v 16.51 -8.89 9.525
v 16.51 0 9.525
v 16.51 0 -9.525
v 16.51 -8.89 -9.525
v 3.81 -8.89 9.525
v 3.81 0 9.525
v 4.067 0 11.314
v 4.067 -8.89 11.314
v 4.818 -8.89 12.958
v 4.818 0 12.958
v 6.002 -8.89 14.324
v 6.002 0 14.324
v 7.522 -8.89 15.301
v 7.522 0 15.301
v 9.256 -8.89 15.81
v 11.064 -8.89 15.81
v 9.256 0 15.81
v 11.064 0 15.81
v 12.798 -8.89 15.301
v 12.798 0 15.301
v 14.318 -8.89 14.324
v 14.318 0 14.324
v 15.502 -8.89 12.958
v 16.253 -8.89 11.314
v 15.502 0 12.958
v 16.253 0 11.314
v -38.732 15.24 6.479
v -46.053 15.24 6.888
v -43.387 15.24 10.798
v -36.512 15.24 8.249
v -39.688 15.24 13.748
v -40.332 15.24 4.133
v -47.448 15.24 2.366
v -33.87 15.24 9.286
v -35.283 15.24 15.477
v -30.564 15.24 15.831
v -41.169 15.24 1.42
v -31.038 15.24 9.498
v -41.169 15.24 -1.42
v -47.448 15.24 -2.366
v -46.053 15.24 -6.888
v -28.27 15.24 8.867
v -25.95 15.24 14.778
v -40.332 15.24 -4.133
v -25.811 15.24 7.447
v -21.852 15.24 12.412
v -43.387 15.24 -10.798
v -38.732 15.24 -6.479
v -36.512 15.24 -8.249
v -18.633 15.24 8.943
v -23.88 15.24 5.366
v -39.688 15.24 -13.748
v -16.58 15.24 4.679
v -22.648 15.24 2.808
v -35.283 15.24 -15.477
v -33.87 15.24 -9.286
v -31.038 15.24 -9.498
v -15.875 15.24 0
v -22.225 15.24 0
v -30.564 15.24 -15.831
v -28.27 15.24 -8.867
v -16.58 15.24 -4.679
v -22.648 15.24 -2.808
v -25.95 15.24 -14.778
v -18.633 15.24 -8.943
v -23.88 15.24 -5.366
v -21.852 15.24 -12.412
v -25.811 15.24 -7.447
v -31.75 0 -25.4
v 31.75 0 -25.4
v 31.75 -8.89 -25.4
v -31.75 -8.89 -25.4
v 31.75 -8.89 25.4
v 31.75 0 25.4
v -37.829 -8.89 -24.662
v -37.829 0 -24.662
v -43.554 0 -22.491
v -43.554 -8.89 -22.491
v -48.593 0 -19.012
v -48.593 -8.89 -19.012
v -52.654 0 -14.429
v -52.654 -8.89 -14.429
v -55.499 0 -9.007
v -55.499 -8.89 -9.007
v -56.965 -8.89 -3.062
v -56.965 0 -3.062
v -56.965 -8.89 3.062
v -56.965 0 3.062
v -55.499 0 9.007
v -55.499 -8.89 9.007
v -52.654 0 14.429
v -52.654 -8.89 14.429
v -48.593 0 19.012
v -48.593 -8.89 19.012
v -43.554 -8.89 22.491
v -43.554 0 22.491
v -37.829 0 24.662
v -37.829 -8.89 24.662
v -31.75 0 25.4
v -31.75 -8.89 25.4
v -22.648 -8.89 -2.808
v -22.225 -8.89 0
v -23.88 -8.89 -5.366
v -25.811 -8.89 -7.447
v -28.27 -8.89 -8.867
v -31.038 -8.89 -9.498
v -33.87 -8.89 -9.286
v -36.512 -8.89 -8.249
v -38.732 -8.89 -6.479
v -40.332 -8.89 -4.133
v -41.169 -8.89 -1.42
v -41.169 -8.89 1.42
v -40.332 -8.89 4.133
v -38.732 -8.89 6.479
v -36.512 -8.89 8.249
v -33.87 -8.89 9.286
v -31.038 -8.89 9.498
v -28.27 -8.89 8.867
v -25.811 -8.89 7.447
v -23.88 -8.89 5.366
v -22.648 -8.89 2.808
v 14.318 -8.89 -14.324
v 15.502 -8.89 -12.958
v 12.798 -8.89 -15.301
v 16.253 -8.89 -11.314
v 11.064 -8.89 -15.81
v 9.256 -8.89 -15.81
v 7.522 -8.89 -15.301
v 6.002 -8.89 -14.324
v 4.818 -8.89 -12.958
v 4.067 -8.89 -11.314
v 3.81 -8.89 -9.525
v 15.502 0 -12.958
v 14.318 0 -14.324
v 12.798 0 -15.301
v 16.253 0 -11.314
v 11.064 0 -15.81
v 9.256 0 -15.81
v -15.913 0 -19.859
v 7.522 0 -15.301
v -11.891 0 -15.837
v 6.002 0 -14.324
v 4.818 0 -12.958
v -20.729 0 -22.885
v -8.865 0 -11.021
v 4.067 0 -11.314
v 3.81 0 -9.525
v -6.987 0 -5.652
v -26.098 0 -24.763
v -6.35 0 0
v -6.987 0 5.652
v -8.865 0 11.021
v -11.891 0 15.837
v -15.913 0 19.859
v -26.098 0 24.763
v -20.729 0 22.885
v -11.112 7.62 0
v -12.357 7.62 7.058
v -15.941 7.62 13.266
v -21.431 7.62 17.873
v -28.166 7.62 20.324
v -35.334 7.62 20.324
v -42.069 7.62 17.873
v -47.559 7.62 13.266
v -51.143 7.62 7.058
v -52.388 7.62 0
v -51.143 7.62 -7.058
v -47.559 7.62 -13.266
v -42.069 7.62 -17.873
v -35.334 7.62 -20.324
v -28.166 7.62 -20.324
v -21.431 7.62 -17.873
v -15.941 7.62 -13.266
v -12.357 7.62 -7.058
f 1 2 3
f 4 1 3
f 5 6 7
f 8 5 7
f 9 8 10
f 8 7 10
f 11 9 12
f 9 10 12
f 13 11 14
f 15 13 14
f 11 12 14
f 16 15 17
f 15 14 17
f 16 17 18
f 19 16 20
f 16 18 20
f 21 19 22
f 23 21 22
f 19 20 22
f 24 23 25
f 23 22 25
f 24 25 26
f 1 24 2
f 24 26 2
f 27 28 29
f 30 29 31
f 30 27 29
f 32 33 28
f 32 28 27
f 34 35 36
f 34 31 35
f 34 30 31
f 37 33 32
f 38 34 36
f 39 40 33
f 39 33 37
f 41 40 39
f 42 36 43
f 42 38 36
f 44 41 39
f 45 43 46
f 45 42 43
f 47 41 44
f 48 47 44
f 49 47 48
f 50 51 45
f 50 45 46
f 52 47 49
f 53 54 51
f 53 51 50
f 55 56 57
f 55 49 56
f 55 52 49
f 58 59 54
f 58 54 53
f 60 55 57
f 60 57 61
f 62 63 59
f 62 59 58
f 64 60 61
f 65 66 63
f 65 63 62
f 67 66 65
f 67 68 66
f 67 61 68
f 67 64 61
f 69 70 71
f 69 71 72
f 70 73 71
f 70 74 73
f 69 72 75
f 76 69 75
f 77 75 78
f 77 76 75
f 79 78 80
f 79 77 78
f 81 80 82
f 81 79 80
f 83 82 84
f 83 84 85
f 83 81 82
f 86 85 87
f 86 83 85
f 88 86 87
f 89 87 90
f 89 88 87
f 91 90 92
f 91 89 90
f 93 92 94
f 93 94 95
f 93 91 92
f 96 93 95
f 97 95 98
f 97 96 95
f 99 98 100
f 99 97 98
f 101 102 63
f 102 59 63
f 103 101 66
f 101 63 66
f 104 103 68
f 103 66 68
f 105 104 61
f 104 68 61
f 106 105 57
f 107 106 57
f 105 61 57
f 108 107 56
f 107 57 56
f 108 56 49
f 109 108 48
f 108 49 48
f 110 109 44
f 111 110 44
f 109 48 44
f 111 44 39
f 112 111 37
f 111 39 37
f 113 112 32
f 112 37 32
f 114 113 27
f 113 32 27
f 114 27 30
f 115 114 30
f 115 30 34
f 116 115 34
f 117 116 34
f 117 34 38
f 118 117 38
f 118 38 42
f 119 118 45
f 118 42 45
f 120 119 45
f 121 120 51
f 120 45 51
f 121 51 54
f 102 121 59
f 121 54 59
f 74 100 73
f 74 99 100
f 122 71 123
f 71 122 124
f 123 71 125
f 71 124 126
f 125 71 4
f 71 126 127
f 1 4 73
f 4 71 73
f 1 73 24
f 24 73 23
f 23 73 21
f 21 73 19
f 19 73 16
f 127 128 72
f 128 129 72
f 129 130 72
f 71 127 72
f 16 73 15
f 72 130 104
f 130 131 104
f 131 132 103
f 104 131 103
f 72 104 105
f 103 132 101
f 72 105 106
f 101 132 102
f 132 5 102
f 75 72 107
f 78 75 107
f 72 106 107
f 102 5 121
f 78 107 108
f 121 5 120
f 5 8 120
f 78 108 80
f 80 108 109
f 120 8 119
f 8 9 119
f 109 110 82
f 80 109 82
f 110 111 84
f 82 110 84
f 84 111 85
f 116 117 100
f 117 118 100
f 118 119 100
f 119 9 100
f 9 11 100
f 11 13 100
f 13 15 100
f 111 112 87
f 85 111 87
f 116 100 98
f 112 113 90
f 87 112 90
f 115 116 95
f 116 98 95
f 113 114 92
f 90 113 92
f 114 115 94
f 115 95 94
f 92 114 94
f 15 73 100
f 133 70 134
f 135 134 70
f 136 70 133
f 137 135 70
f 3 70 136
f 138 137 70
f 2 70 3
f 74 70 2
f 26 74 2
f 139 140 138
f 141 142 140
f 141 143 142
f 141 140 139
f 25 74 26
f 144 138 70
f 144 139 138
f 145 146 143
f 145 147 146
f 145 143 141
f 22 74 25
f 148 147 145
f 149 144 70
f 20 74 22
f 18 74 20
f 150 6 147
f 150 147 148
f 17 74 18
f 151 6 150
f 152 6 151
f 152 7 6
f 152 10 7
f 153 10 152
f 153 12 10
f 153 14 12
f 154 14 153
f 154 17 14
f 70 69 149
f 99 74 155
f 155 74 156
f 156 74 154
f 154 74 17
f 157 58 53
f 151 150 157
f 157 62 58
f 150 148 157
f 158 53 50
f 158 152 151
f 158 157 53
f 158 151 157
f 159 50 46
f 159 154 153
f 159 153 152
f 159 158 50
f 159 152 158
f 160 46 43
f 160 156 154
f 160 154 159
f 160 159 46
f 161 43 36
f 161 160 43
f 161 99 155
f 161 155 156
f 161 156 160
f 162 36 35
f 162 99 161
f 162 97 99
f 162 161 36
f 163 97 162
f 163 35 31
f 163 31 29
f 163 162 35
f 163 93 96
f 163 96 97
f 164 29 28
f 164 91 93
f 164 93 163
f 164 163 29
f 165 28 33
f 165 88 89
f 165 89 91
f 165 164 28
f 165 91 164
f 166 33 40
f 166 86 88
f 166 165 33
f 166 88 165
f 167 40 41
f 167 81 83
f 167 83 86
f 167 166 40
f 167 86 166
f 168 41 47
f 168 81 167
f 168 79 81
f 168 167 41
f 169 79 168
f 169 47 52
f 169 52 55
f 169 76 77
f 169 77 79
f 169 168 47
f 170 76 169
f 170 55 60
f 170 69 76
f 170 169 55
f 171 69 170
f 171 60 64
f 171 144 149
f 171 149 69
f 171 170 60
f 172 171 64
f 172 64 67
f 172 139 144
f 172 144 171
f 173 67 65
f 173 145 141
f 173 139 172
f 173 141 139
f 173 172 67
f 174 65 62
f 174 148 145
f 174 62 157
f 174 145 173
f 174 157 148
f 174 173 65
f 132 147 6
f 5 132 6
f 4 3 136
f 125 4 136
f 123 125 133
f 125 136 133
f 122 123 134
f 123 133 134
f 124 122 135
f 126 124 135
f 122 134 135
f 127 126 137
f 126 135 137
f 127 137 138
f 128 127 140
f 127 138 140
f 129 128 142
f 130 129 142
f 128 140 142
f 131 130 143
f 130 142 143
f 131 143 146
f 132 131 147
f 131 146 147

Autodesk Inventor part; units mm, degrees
ref_plane "YZ Plane" through (0, 0, 0) normal (1, 0, 0) x (0, 1, 0)
ref_plane "XZ Plane" through (0, 0, 0) normal (0, 1, 0) x (-1, 0, 0)
sketch "Sketch1" plane through (0, 0, 0) normal (0, 1, 0) x (-1, 0, 0)
  line L0 (31.75, 25.4) -> (-31.75, 25.4)
  line L1 (-31.75, 25.4) -> (-31.75, -25.4)
  line L2 (-31.75, -25.4) -> (31.75, -25.4)
  line L3 (31.75, -25.4) -> (31.75, 25.4)
  line L4 (31.75, 25.4) -> (-31.75, -25.4) construction
  line L5 (-31.75, 25.4) -> (31.75, -25.4) construction
  arc A0 (31.75, -25.4) -> (31.75, 25.4) centre (31.75, 0) ccw
  point P0 (0, 0)
  dimension "d5" = 63.5
  dimension "d6" = 50.8
extrude "Extrusion1" add sketch "Sketch1" against normal blind 8.89
sketch "Sketch2" plane through (0, 0, 0) normal (0, 1, 0) x (1, 0, 0)
  line L0 (31.75, -25.4) -> (31.75, 25.4) projected
  line L1 (-31.75, -25.4) -> (31.75, -25.4) projected
  line L2 (31.75, 25.4) -> (-31.75, 25.4) projected
  arc A0 (-31.75, 25.4) -> (-31.75, -25.4) centre (-31.75, 0) ccw projected
  line L3 (31.75, 0) -> (16.51, 0)
  line L4 (3.81, -9.525) -> (16.51, -9.525)
  line L5 (16.51, -9.525) -> (16.51, 9.525)
  line L6 (16.51, 9.525) -> (3.81, 9.525)
  line L7 (3.81, 9.525) -> (3.81, -9.525)
  line L8 (3.81, -9.525) -> (16.51, 9.525) construction
  line L9 (16.51, -9.525) -> (3.81, 9.525) construction
  arc A1 (3.81, -9.525) -> (16.51, -9.525) centre (10.16, -9.525) ccw
  arc A2 (16.51, 9.525) -> (3.81, 9.525) centre (10.16, 9.525) ccw
  point P0 (0, 0)
  dimension "d9" = 15.24
  dimension "d10" = 12.7
  dimension "d11" = 19.05
extrude "Extrusion2" cut sketch "Sketch2" against normal blind 8.89 contours L5 L4 L7 L6 | A1 L4 | L6 A2
sketch "Sketch3" plane through (0, 0, 0) normal (0, 1, 0) x (1, 0, 0)
  arc A0 (-31.75, 25.4) -> (-31.75, -25.4) centre (-31.75, 0) ccw projected
  circle A1 centre (-31.75, 0) radius 25.4
  point P0 (0, 0)
  dimension "d14" = 50.8
ref_plane "Work Plane1" through (0, 15.24, 0) normal (0, 1, 0) x (1, 0, 0)
sketch "Sketch5" plane through (0, 15.24, 0) normal (0, 1, 0) x (1, 0, 0)
  arc A0 (-31.75, 25.4) -> (-31.75, -25.4) centre (-31.75, 0) ccw projected
  circle A1 centre (-31.75, 0) radius 15.875
  point P0 (0, 0)
  dimension "d20" = 31.75
loft "Loft1" add profiles "Sketch3", "Sketch5"
sketch "Sketch6" plane through (-31.75, 15.24, 0) normal (0, 1, 0) x (1, 0, 0)
  circle A0 centre (0, 0) radius 15.875 projected
  circle A1 centre (0, 0) radius 9.525
  point P0 (31.75, 0)
  dimension "d25" = 19.05
extrude "Extrusion3" cut sketch "Sketch6" against normal blind 50.8 contours A1
properties part number "Coupler for Section"
